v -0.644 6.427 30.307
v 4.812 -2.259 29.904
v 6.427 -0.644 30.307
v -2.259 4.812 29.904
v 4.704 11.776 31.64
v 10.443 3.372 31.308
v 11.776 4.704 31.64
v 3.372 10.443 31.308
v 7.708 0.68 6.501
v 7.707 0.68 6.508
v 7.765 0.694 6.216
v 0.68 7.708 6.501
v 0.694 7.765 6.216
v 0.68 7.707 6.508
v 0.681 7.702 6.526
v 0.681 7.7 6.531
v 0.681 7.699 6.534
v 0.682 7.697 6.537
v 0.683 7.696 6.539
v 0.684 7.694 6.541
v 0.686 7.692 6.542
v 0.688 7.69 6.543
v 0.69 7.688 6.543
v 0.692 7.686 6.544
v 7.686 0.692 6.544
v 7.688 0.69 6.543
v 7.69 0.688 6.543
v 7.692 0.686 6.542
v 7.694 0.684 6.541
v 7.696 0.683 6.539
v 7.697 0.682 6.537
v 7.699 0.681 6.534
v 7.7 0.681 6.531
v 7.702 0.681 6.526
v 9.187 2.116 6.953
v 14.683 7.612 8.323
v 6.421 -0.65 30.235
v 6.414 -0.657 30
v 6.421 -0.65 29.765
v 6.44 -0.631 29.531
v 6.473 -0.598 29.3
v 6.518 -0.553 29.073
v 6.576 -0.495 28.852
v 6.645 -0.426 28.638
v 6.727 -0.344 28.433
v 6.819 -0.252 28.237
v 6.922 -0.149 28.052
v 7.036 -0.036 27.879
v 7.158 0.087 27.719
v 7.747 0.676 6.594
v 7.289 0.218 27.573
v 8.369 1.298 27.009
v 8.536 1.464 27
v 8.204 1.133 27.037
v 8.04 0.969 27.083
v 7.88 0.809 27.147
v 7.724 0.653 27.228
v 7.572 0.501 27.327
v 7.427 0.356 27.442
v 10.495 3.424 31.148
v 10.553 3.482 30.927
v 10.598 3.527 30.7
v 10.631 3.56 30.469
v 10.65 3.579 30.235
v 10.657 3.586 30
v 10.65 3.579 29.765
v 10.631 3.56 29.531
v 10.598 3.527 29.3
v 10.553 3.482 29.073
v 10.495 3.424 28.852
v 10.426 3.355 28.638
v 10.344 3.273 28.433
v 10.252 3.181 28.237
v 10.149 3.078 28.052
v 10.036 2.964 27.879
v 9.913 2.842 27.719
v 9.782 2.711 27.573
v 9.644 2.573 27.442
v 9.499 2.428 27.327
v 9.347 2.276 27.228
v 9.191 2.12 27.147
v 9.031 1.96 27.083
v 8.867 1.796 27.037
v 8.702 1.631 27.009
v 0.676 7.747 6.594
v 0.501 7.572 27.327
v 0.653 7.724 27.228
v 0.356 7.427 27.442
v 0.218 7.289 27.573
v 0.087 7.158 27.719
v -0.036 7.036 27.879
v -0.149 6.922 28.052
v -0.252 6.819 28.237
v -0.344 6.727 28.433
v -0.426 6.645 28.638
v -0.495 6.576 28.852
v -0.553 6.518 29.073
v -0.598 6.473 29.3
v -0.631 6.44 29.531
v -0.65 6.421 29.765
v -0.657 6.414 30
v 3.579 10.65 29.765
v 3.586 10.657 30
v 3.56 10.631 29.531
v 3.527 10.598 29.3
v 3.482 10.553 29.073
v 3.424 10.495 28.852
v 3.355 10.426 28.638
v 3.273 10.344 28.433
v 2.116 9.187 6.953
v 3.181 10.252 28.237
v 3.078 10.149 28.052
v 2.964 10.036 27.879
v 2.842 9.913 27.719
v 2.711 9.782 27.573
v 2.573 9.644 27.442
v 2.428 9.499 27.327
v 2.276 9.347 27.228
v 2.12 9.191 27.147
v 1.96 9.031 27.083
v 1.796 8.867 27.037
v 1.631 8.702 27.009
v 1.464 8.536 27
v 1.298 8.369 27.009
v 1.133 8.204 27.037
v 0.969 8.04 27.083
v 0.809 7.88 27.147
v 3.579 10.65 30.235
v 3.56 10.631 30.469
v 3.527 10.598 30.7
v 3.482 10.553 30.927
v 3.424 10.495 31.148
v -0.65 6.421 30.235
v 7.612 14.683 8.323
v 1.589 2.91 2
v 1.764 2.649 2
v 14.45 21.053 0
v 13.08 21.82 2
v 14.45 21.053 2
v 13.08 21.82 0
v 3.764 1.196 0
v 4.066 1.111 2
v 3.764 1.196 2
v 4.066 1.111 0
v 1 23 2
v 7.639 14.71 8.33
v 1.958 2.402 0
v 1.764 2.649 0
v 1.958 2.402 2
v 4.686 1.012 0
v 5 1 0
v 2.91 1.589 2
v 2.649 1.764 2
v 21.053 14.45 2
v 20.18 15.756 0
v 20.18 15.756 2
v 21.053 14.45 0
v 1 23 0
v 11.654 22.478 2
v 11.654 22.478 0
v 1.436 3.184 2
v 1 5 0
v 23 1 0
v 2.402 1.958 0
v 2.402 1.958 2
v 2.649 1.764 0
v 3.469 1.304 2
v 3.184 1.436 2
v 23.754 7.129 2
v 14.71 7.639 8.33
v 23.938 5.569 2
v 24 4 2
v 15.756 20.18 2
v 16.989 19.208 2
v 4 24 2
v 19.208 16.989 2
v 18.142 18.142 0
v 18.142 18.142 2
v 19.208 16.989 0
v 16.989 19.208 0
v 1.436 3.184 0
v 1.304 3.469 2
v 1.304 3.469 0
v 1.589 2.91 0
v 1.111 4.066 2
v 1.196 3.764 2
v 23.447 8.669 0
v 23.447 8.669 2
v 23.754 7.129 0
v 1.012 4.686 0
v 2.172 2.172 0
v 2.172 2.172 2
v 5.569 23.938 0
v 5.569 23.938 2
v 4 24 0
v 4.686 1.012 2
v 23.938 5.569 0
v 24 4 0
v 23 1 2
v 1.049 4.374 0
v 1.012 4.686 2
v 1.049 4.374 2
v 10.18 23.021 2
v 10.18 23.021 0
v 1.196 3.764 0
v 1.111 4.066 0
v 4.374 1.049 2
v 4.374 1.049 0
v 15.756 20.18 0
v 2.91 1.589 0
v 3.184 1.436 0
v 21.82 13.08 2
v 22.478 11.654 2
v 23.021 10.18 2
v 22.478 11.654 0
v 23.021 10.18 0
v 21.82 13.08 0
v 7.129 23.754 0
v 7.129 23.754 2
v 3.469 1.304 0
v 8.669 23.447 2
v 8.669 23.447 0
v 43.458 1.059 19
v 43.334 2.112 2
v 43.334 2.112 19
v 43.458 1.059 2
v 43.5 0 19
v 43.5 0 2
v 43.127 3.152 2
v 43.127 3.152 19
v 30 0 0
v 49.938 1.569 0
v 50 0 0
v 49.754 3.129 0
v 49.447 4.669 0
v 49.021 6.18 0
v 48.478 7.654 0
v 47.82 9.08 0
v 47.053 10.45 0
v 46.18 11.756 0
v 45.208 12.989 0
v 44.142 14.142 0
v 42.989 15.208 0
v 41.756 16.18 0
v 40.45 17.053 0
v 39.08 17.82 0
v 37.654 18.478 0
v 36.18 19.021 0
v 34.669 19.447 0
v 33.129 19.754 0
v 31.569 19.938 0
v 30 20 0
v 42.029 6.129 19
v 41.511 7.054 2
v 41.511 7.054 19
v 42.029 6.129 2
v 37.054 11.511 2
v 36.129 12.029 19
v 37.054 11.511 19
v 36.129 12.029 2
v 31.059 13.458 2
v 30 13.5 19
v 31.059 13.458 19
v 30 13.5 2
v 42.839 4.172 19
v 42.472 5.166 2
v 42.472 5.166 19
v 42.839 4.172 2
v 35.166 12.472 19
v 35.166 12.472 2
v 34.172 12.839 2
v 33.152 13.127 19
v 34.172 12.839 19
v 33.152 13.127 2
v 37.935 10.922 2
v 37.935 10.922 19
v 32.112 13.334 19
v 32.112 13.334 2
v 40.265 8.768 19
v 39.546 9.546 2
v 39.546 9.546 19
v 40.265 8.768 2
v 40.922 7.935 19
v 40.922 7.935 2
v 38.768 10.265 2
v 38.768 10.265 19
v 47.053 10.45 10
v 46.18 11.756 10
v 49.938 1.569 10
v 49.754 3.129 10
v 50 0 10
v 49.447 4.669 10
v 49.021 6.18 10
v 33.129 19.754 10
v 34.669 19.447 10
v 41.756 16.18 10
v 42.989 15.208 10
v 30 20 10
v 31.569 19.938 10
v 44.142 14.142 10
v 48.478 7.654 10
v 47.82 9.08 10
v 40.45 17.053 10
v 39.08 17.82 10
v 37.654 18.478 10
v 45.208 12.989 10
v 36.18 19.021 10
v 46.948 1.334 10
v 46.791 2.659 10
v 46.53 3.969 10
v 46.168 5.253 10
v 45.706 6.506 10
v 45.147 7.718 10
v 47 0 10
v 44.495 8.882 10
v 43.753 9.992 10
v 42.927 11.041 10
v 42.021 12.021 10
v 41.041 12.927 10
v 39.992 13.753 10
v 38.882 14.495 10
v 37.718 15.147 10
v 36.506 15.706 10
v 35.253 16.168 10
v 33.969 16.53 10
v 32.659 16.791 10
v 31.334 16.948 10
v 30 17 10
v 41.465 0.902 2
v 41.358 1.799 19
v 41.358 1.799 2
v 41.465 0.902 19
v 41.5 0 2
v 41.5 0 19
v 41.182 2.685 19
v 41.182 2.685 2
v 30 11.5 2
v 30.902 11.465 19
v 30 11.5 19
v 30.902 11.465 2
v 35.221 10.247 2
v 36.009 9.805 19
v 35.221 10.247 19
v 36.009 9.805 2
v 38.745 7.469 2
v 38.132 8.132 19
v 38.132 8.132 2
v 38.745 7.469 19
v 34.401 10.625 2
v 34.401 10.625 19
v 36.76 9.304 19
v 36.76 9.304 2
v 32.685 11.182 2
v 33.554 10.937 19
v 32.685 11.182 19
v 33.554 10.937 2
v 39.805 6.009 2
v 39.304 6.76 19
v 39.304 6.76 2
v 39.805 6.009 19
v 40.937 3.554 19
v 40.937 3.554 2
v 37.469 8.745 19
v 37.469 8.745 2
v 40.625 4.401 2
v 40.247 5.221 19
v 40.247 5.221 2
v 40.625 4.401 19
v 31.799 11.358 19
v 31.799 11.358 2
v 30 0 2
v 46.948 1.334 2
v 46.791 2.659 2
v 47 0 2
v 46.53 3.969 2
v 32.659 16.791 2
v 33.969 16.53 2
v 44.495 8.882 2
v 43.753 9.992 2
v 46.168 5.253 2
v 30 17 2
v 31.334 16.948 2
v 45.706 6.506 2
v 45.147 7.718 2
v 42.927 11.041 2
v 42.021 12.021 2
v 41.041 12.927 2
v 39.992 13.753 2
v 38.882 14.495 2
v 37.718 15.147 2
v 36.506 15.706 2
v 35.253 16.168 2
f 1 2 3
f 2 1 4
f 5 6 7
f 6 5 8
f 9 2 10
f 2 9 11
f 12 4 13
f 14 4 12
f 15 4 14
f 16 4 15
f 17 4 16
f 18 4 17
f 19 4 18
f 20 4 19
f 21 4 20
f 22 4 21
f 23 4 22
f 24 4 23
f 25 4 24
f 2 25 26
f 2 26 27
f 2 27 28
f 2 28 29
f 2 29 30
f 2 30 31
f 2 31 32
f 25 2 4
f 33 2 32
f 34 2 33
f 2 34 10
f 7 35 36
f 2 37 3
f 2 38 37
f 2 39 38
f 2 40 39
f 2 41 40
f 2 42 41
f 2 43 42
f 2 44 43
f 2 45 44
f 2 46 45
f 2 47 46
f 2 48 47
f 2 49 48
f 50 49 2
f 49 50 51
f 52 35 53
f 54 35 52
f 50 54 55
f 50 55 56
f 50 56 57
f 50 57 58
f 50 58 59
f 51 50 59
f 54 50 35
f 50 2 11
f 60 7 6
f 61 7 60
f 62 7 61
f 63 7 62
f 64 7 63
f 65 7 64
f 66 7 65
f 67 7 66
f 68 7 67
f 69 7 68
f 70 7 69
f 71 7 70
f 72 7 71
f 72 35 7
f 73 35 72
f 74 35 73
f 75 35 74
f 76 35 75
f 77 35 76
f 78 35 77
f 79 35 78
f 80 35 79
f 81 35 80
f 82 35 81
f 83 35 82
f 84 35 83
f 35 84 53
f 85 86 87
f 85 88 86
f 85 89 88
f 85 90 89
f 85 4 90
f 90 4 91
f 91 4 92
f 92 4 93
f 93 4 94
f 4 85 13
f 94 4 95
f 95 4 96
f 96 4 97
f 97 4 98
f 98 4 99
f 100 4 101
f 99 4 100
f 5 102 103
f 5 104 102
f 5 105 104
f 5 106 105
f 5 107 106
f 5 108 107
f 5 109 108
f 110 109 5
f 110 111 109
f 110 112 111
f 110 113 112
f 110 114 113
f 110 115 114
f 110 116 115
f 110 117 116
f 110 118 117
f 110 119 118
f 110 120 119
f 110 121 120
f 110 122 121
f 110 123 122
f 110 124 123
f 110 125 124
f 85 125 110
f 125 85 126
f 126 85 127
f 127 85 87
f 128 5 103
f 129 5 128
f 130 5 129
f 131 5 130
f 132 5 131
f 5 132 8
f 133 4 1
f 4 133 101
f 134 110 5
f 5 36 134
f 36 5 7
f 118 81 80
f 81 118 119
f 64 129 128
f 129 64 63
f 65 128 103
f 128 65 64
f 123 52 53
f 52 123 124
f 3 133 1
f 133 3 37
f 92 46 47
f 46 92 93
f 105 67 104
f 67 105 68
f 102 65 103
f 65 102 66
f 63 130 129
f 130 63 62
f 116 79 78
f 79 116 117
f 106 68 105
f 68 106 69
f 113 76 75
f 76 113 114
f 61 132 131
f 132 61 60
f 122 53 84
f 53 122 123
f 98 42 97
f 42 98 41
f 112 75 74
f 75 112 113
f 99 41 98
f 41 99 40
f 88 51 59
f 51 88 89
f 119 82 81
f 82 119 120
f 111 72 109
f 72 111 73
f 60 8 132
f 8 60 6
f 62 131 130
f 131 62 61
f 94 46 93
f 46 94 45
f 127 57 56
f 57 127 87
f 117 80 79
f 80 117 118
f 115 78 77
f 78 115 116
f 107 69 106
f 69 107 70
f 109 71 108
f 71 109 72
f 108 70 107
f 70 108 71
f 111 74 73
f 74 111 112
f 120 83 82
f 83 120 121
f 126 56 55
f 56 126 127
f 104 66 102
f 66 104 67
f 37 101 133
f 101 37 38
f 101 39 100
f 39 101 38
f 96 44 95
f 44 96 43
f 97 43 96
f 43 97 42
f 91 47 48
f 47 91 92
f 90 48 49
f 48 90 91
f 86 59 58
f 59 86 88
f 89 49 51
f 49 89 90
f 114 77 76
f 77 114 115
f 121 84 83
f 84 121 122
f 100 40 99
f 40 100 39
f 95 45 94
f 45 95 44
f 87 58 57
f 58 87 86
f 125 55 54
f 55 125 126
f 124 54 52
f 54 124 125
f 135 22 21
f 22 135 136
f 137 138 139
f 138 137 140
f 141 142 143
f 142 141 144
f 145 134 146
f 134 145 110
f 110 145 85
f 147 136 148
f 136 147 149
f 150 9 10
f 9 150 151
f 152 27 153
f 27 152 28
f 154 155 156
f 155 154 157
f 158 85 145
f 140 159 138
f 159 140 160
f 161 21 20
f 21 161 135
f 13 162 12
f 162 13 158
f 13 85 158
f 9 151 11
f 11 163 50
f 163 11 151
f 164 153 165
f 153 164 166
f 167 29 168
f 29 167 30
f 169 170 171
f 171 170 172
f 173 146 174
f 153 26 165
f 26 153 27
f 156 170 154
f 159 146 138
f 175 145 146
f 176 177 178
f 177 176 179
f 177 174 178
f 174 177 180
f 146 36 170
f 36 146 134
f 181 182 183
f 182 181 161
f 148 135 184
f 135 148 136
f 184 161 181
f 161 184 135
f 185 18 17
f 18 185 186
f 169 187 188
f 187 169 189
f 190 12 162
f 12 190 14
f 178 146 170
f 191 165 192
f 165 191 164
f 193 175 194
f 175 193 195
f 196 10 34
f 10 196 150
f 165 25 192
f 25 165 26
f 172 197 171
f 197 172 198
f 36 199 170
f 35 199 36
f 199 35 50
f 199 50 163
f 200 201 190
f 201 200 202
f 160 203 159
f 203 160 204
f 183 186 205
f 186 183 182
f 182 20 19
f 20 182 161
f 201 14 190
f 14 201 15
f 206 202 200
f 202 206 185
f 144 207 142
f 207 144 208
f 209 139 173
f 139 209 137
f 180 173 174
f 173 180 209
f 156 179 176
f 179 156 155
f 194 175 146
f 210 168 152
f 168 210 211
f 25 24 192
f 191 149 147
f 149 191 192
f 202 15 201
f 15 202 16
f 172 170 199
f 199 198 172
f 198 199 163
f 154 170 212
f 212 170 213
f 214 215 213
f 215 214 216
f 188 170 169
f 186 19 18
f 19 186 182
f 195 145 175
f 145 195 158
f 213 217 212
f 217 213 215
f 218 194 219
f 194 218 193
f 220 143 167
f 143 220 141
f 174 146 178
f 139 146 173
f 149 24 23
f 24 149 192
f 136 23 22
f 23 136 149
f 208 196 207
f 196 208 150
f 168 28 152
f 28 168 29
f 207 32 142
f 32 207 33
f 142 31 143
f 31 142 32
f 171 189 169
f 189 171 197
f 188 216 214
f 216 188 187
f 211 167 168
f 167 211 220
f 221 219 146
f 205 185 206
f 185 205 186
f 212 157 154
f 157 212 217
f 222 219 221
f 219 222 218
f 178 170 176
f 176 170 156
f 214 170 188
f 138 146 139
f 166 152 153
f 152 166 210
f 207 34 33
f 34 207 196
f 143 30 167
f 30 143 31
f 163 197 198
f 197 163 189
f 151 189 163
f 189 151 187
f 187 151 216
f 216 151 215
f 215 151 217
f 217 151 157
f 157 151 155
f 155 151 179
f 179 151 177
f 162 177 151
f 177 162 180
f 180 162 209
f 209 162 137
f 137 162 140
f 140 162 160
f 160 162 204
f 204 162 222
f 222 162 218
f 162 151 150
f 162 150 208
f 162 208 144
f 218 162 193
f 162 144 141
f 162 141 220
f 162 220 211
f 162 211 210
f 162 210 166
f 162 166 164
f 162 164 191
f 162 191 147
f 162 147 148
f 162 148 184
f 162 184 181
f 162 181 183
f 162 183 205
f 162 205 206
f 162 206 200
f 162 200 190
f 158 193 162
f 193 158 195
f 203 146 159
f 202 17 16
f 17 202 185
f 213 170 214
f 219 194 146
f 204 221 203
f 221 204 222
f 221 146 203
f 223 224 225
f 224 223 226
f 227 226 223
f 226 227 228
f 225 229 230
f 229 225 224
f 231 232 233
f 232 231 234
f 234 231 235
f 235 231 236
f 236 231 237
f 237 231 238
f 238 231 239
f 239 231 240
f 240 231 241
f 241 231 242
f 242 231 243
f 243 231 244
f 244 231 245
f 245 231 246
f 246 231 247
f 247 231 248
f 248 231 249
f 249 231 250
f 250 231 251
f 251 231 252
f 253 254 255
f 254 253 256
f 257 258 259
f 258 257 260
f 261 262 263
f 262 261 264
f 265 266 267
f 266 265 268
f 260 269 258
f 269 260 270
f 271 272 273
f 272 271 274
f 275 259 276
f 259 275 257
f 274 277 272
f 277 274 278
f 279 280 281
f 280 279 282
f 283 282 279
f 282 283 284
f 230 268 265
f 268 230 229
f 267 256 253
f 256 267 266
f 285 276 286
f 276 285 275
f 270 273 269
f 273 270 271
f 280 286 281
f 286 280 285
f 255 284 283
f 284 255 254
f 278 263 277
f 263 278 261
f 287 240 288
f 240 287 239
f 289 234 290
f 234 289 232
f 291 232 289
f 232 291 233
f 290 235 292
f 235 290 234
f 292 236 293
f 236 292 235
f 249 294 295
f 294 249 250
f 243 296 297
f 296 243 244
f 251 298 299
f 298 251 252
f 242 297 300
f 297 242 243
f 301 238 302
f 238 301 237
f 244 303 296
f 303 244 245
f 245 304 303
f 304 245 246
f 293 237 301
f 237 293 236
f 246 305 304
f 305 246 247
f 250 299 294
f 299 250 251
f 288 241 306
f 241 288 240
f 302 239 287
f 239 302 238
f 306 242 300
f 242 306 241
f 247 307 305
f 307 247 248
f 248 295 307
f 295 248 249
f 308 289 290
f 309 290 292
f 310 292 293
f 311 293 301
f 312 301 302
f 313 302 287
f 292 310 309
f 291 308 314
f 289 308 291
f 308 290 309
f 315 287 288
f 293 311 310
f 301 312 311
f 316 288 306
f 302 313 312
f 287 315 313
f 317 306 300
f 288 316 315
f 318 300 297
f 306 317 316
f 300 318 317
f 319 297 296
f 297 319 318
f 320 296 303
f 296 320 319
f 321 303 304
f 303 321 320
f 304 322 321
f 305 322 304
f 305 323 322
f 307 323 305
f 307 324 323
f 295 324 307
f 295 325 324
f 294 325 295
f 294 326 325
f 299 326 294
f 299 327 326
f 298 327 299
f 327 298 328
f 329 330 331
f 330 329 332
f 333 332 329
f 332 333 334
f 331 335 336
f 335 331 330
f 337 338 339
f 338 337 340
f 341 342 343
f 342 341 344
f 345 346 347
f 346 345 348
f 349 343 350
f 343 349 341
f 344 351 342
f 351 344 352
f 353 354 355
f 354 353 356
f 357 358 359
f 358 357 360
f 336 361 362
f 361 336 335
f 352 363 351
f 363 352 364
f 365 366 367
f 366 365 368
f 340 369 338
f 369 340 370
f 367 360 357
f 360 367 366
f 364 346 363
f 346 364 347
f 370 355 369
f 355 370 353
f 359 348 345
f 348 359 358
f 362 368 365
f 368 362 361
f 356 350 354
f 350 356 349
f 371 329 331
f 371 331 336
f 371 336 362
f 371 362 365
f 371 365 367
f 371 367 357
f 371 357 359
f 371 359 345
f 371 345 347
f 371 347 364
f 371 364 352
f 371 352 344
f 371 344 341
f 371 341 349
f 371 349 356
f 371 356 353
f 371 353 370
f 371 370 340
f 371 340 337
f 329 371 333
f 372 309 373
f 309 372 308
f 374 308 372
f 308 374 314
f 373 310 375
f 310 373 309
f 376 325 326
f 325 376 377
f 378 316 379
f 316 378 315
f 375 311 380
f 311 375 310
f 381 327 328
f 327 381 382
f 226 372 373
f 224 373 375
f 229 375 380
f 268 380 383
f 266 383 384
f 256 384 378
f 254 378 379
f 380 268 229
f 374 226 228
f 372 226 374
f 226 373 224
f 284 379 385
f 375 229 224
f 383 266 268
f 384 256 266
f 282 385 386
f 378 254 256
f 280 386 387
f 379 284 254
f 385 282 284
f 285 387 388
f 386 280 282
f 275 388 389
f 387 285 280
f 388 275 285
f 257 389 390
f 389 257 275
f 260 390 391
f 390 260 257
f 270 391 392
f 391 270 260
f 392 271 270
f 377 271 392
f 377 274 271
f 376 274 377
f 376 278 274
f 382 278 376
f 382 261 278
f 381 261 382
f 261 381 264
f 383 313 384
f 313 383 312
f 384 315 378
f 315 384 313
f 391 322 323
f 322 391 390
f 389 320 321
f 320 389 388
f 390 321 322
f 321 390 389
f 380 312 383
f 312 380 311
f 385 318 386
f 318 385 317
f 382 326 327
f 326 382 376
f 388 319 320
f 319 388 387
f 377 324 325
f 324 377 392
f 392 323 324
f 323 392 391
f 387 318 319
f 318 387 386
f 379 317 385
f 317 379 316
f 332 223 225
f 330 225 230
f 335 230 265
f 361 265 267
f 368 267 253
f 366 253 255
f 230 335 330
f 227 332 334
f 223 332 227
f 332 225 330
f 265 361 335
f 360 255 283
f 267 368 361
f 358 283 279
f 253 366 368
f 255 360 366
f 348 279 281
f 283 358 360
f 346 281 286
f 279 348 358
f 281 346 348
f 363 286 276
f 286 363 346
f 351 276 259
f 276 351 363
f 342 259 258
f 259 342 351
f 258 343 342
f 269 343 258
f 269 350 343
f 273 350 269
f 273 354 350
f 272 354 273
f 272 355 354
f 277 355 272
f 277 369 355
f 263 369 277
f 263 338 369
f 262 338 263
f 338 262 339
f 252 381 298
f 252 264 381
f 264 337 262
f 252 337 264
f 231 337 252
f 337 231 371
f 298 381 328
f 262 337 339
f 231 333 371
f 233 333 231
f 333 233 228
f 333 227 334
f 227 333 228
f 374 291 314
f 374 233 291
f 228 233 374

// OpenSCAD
$fn=80;

module bottom(r1=11.5,r2=13.5,r3=17,r4=20) {
   intersection() {
      difference() {
         difference() {
            union() {
               cylinder (r=r2,h=20);
               cylinder (r=r4,h=10);
            }
            translate([0,0,2]) cylinder (r=r1,h=31);
         }
         translate([0,0,2]) difference() {
            cylinder (r=r3,h=40);
            cylinder (r=r2,h=41);
         }
      }
      translate([0,0,-1]) cube([30,30,20],center=false);
   }
}


module top() {
   hull() {
      translate([5,5,0]) cylinder(r=4,h=2);
      translate([1,5,0]) cube([4,18,2],center=false);
      translate([5,1,0]) cube([18,4,2],center=false);
      translate([4,4,0]) intersection() {
         cylinder(r=20,h=2);
         translate([0,0,-1]) cube([30,30,20],center=false);
      }
      translate([8,8,5]) rotate([0,-10,45]) cube([10,10,5],center=true);
   }

   difference() {
      translate([6.6,6.6,16]) rotate([0,-10,45]) cube([10,10,30],center=true);
      translate([5,5,30]) rotate([90,0,45]) translate([0,0,-10]) cylinder(d=6,h=20);
   }
}

translate([0,0,0])  top();
translate([30,0,0]) bottom();
